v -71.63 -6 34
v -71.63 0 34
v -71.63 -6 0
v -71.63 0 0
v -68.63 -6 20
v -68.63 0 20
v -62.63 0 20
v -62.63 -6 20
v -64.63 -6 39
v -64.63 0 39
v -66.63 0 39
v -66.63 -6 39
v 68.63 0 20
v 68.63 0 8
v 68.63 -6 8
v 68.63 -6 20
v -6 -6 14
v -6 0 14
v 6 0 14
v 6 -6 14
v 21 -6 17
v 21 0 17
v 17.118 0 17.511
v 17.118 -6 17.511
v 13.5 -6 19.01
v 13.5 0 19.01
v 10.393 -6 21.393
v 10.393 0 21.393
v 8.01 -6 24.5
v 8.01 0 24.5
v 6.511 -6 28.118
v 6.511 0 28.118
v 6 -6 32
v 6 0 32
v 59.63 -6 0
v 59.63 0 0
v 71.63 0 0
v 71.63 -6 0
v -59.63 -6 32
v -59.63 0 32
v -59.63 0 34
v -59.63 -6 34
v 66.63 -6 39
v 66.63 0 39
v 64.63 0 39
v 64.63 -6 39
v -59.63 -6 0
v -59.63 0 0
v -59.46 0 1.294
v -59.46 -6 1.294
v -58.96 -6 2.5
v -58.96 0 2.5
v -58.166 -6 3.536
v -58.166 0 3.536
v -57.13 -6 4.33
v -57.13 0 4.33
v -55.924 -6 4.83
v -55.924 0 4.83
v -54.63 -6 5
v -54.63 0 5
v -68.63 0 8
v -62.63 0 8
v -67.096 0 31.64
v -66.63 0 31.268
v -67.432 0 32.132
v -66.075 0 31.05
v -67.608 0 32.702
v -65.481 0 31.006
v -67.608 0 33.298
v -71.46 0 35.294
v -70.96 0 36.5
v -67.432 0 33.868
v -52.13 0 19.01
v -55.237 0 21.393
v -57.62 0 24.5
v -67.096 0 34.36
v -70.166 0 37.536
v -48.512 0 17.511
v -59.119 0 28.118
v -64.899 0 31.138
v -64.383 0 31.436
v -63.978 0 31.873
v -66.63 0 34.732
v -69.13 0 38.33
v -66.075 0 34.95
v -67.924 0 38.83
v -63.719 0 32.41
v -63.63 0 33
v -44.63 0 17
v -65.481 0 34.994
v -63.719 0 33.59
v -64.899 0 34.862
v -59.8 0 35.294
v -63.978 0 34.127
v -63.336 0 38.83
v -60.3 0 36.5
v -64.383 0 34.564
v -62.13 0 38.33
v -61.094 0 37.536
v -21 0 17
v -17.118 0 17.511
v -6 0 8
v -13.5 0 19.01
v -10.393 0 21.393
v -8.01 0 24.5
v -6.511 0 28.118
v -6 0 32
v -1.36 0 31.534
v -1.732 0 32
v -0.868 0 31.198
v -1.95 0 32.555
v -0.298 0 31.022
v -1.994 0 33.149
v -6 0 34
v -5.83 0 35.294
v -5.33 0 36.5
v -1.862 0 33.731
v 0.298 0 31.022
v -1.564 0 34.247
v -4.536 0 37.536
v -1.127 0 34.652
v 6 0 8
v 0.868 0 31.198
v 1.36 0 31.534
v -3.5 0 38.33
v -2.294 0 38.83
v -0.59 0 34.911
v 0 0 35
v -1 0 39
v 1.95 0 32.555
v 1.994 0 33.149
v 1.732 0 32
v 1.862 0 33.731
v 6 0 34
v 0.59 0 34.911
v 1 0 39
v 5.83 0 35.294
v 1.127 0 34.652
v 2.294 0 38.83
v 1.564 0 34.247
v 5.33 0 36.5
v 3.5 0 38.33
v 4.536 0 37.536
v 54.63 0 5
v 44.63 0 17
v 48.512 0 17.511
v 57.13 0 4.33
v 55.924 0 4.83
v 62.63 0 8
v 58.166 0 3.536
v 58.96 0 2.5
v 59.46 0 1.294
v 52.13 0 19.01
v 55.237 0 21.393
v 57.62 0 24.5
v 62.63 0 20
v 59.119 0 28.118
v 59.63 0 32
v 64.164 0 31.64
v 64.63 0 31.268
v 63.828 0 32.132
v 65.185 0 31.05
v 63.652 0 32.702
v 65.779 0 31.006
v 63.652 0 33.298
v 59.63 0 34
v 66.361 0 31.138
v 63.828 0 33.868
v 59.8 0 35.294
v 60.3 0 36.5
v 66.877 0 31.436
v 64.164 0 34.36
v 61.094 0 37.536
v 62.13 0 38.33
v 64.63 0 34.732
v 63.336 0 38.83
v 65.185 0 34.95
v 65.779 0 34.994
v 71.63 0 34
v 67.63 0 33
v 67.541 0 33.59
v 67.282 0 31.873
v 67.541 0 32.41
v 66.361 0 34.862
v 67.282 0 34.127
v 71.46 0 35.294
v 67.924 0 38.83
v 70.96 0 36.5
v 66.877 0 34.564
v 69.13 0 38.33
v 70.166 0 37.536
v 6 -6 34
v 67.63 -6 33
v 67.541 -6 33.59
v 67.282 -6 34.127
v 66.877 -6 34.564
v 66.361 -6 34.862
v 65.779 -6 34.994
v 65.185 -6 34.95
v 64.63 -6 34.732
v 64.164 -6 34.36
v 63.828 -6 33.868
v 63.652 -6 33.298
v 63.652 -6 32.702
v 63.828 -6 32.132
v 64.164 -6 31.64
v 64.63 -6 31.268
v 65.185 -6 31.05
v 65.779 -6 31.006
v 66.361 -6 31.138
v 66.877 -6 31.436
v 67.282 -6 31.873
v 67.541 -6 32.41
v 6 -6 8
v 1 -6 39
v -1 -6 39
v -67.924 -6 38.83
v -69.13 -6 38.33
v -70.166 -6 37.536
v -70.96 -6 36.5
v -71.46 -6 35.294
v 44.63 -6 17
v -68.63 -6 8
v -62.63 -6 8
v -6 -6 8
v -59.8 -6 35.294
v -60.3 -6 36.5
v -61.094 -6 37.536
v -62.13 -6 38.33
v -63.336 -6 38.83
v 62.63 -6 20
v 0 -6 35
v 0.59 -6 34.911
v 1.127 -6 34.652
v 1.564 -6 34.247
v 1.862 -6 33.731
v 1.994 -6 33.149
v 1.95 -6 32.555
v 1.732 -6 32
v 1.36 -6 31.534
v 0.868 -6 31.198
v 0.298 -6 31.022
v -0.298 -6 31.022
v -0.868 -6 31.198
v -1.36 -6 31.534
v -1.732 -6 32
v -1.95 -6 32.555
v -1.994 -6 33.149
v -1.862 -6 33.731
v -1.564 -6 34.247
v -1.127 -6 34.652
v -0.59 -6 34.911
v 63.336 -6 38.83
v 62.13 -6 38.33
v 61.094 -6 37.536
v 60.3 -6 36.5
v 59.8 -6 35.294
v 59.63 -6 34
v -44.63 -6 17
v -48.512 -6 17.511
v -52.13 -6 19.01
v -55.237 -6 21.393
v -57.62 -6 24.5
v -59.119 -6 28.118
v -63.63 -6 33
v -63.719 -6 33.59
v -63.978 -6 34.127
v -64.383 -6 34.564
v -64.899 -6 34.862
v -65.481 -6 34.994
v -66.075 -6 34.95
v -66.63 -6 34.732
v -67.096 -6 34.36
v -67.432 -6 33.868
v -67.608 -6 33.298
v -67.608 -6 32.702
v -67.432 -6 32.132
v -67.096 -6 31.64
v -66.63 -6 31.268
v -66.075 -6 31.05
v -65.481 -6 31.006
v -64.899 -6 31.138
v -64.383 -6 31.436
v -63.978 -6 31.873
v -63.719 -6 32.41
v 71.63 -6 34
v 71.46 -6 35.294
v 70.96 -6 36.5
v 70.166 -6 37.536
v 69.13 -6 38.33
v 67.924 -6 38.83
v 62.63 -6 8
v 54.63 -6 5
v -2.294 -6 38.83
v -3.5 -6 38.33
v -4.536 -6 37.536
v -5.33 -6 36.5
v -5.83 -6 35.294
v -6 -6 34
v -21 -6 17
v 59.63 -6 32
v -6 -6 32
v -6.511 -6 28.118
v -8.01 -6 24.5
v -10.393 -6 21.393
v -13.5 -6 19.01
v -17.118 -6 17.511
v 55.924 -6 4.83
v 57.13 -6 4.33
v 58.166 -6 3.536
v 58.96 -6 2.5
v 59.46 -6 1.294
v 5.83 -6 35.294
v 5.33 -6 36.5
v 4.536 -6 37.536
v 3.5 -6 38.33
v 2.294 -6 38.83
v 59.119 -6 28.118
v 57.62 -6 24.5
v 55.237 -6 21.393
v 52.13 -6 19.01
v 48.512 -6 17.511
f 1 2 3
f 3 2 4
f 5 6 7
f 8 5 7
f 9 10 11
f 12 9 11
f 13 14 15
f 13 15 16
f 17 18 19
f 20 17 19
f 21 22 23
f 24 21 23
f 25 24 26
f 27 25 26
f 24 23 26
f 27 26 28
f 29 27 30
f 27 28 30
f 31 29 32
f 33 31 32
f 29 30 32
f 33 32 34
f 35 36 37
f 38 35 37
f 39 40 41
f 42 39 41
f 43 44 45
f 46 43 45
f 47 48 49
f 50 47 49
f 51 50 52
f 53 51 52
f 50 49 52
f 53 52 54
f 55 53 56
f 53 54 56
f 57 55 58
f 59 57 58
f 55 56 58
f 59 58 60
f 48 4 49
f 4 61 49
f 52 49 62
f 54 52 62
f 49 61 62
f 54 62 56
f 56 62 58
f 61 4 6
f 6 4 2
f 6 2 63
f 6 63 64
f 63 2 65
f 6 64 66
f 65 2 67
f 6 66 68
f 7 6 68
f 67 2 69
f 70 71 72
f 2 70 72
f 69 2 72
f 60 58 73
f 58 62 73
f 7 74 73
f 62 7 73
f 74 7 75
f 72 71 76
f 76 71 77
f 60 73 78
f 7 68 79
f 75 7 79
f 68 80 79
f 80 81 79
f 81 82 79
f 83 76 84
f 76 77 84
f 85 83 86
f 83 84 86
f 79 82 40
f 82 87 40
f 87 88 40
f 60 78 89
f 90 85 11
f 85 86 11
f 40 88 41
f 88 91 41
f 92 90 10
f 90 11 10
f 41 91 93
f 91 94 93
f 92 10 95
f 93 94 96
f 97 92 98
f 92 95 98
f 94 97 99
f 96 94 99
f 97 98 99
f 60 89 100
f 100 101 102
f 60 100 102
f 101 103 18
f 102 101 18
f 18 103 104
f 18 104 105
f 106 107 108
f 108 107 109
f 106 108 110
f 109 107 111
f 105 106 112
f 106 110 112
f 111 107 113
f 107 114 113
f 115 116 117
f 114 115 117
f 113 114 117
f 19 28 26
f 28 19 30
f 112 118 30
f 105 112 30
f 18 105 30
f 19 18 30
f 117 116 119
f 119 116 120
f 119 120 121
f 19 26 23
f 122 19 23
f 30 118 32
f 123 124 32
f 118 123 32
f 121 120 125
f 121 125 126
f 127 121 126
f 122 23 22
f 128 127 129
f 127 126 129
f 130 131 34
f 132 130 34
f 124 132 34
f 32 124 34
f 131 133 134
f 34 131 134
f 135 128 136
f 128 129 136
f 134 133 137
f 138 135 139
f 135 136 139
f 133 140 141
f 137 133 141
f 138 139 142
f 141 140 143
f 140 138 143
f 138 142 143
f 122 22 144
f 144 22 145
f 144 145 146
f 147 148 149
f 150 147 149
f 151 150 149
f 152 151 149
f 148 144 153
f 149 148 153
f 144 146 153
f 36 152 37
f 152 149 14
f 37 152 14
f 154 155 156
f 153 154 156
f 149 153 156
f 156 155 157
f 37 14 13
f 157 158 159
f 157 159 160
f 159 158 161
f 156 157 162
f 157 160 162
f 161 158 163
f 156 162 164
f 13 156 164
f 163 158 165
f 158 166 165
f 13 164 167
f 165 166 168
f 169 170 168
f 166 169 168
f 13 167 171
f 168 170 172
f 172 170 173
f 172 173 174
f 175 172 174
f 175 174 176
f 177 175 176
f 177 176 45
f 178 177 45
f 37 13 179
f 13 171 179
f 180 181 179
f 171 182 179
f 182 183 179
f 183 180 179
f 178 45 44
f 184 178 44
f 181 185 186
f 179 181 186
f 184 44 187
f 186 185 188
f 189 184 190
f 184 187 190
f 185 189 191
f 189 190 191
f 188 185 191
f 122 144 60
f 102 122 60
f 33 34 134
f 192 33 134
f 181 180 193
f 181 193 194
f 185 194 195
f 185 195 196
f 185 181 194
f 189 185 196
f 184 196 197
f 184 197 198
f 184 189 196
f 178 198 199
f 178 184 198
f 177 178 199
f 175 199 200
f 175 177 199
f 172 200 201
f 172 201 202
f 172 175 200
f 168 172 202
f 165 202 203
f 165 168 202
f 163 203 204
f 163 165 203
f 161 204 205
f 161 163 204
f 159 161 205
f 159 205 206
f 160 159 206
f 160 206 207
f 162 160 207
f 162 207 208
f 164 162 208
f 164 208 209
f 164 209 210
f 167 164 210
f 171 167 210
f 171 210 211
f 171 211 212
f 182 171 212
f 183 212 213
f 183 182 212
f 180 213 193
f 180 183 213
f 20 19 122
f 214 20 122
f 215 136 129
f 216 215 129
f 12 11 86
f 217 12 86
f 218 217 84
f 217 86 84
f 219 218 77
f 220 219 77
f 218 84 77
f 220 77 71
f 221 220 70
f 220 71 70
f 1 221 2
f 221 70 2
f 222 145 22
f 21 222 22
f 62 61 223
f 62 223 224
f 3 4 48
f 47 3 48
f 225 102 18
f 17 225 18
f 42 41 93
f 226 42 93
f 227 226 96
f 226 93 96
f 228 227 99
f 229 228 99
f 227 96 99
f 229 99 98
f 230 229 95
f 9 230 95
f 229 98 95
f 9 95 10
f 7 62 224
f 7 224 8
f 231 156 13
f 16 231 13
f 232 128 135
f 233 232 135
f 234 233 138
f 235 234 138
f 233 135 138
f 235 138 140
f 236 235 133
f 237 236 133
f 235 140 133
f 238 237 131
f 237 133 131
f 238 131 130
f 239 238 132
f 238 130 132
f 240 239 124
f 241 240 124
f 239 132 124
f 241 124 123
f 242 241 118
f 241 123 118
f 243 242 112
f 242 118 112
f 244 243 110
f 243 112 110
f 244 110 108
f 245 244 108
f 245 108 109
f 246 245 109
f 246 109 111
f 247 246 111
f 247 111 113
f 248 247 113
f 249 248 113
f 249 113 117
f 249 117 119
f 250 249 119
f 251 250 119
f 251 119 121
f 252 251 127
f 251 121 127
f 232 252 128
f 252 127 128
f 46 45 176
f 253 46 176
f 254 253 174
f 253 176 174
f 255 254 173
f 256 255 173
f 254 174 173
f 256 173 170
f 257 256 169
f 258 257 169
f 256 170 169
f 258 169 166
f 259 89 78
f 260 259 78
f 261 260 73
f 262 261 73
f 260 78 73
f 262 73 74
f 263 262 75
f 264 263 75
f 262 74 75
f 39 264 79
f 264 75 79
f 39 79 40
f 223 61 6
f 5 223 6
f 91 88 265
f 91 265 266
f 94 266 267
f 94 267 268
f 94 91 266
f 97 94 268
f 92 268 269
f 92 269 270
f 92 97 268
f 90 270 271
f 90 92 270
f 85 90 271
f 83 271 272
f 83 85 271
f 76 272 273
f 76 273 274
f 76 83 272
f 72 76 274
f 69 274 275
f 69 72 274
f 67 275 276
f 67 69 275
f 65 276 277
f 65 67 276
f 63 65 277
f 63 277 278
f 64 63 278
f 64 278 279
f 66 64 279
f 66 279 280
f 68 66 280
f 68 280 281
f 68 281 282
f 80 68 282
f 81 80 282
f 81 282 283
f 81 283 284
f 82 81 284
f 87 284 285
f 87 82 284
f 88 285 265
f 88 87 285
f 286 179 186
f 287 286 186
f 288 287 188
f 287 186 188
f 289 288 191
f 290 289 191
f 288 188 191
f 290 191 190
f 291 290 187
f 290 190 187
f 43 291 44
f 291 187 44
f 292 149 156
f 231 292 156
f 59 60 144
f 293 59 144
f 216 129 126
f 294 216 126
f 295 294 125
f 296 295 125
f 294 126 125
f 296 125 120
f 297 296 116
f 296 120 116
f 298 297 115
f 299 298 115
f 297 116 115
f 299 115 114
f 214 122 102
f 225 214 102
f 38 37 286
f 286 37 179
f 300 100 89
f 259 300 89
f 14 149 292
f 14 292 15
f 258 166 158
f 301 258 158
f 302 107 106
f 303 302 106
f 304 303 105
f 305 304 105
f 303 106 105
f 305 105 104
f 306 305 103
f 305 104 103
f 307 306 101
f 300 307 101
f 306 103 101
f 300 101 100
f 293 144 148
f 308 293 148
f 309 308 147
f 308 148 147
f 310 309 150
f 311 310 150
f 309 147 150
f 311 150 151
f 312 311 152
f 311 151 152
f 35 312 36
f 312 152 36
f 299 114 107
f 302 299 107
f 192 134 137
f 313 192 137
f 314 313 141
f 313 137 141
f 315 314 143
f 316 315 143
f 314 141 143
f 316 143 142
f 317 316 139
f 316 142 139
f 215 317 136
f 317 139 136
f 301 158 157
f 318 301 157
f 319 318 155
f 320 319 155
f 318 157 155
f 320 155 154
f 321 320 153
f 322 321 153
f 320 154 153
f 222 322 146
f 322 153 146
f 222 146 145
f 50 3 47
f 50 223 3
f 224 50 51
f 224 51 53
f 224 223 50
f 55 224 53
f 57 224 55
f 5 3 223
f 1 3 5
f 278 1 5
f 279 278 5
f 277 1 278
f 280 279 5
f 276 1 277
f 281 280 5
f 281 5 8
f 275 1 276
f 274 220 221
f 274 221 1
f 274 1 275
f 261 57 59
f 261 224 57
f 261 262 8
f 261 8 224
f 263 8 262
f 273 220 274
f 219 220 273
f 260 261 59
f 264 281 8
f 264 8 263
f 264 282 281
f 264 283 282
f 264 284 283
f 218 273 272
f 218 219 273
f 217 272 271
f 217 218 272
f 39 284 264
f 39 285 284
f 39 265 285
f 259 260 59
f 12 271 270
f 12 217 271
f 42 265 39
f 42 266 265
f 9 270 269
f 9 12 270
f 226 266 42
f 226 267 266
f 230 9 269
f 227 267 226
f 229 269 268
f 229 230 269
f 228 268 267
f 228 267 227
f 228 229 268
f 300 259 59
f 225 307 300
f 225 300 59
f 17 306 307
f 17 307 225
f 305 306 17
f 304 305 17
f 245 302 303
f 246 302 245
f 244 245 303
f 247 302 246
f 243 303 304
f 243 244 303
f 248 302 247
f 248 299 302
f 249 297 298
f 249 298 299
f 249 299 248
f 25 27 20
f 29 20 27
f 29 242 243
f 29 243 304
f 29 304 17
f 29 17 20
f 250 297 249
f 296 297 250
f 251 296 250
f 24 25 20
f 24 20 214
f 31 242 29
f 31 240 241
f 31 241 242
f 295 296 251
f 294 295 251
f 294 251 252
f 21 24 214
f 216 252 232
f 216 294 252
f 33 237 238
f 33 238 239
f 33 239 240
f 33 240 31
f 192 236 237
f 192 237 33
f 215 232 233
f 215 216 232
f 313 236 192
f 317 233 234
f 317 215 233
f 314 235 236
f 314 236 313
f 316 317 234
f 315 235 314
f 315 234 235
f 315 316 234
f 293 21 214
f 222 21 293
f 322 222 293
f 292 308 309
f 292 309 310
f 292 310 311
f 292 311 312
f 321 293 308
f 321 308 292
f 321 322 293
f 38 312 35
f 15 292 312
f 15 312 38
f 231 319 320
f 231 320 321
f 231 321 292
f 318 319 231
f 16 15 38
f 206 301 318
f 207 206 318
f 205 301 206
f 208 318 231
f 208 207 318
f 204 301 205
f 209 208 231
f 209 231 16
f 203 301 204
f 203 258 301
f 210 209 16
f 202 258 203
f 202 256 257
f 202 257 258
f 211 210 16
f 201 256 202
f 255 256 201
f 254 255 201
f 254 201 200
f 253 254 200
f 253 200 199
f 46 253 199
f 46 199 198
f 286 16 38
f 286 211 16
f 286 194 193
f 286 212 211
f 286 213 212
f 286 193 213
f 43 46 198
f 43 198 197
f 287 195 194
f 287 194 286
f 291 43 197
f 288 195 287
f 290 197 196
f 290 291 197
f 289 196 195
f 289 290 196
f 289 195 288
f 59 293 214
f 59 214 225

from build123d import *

# Parameters (mm, degrees)
F0_W     = 6
F0_H     = 12
F0_R     = 2
F1_DEPTH = 6


with BuildPart() as f1:
    # F0 (on Front) → F1 (new body)
    with BuildSketch(Plane.XZ):
        with BuildLine():
            Line((1, 39), (0, 39))
            Line((0, 39), (-1, 39))
            ThreePointArc((-1, 39), (-4.535534, 37.535534), (-6, 34))
            Line((-6, 34), (-6, 32))
            ThreePointArc((-6, 32), (-10.393398, 21.393398), (-21, 17))
            Line((-21, 17), (-44.63, 17))
            ThreePointArc((-44.63, 17), (-55.236602, 21.393398), (-59.63, 32))
            Line((-59.63, 32), (-59.63, 34))
            ThreePointArc((-59.63, 34), (-61.094466, 37.535534), (-64.63, 39))
            Line((-64.63, 39), (-66.63, 39))
            ThreePointArc((-66.63, 39), (-70.165534, 37.535534), (-71.63, 34))
            Line((-71.63, 34), (-71.63, 0))
            Line((-71.63, 0), (-59.63, 0))
            ThreePointArc((-59.63, 0), (-58.165534, 3.535534), (-54.63, 5))
            Line((-54.63, 5), (0, 5))
            Line((0, 5), (54.63, 5))
            ThreePointArc((54.63, 5), (58.165534, 3.535534), (59.63, 0))
            Line((59.63, 0), (71.63, 0))
            Line((71.63, 0), (71.63, 34))
            ThreePointArc((71.63, 34), (70.165534, 37.535534), (66.63, 39))
            Line((66.63, 39), (64.63, 39))
            ThreePointArc((64.63, 39), (61.094466, 37.535534), (59.63, 34))
            Line((59.63, 34), (59.63, 32))
            ThreePointArc((59.63, 32), (55.236602, 21.393398), (44.63, 17))
            Line((44.63, 17), (21, 17))
            ThreePointArc((21, 17), (10.393398, 21.393398), (6, 32))
            Line((6, 32), (6, 34))
            ThreePointArc((6, 34), (4.535534, 37.535534), (1, 39))
        make_face()
        with Locations((-65.63, 14)):
            Rectangle(F0_W, F0_H, mode=Mode.SUBTRACT)
        Polygon((-6, 14), (0, 14), (6, 14), (6, 8), (0, 8), (-6, 8), align=None, mode=Mode.SUBTRACT)
        with Locations((65.63, 14)):
            Rectangle(F0_W, F0_H, mode=Mode.SUBTRACT)
        with Locations((-65.63, 33)):
            Circle(F0_R, mode=Mode.SUBTRACT)
        with BuildLine():
            ThreePointArc((0, 31), (-2, 33), (0, 35))
            ThreePointArc((0, 35), (2, 33), (0, 31))
        make_face(mode=Mode.SUBTRACT)
        with Locations((65.63, 33)):
            Circle(F0_R, mode=Mode.SUBTRACT)
    extrude(amount=F1_DEPTH)


solid = f1.part
